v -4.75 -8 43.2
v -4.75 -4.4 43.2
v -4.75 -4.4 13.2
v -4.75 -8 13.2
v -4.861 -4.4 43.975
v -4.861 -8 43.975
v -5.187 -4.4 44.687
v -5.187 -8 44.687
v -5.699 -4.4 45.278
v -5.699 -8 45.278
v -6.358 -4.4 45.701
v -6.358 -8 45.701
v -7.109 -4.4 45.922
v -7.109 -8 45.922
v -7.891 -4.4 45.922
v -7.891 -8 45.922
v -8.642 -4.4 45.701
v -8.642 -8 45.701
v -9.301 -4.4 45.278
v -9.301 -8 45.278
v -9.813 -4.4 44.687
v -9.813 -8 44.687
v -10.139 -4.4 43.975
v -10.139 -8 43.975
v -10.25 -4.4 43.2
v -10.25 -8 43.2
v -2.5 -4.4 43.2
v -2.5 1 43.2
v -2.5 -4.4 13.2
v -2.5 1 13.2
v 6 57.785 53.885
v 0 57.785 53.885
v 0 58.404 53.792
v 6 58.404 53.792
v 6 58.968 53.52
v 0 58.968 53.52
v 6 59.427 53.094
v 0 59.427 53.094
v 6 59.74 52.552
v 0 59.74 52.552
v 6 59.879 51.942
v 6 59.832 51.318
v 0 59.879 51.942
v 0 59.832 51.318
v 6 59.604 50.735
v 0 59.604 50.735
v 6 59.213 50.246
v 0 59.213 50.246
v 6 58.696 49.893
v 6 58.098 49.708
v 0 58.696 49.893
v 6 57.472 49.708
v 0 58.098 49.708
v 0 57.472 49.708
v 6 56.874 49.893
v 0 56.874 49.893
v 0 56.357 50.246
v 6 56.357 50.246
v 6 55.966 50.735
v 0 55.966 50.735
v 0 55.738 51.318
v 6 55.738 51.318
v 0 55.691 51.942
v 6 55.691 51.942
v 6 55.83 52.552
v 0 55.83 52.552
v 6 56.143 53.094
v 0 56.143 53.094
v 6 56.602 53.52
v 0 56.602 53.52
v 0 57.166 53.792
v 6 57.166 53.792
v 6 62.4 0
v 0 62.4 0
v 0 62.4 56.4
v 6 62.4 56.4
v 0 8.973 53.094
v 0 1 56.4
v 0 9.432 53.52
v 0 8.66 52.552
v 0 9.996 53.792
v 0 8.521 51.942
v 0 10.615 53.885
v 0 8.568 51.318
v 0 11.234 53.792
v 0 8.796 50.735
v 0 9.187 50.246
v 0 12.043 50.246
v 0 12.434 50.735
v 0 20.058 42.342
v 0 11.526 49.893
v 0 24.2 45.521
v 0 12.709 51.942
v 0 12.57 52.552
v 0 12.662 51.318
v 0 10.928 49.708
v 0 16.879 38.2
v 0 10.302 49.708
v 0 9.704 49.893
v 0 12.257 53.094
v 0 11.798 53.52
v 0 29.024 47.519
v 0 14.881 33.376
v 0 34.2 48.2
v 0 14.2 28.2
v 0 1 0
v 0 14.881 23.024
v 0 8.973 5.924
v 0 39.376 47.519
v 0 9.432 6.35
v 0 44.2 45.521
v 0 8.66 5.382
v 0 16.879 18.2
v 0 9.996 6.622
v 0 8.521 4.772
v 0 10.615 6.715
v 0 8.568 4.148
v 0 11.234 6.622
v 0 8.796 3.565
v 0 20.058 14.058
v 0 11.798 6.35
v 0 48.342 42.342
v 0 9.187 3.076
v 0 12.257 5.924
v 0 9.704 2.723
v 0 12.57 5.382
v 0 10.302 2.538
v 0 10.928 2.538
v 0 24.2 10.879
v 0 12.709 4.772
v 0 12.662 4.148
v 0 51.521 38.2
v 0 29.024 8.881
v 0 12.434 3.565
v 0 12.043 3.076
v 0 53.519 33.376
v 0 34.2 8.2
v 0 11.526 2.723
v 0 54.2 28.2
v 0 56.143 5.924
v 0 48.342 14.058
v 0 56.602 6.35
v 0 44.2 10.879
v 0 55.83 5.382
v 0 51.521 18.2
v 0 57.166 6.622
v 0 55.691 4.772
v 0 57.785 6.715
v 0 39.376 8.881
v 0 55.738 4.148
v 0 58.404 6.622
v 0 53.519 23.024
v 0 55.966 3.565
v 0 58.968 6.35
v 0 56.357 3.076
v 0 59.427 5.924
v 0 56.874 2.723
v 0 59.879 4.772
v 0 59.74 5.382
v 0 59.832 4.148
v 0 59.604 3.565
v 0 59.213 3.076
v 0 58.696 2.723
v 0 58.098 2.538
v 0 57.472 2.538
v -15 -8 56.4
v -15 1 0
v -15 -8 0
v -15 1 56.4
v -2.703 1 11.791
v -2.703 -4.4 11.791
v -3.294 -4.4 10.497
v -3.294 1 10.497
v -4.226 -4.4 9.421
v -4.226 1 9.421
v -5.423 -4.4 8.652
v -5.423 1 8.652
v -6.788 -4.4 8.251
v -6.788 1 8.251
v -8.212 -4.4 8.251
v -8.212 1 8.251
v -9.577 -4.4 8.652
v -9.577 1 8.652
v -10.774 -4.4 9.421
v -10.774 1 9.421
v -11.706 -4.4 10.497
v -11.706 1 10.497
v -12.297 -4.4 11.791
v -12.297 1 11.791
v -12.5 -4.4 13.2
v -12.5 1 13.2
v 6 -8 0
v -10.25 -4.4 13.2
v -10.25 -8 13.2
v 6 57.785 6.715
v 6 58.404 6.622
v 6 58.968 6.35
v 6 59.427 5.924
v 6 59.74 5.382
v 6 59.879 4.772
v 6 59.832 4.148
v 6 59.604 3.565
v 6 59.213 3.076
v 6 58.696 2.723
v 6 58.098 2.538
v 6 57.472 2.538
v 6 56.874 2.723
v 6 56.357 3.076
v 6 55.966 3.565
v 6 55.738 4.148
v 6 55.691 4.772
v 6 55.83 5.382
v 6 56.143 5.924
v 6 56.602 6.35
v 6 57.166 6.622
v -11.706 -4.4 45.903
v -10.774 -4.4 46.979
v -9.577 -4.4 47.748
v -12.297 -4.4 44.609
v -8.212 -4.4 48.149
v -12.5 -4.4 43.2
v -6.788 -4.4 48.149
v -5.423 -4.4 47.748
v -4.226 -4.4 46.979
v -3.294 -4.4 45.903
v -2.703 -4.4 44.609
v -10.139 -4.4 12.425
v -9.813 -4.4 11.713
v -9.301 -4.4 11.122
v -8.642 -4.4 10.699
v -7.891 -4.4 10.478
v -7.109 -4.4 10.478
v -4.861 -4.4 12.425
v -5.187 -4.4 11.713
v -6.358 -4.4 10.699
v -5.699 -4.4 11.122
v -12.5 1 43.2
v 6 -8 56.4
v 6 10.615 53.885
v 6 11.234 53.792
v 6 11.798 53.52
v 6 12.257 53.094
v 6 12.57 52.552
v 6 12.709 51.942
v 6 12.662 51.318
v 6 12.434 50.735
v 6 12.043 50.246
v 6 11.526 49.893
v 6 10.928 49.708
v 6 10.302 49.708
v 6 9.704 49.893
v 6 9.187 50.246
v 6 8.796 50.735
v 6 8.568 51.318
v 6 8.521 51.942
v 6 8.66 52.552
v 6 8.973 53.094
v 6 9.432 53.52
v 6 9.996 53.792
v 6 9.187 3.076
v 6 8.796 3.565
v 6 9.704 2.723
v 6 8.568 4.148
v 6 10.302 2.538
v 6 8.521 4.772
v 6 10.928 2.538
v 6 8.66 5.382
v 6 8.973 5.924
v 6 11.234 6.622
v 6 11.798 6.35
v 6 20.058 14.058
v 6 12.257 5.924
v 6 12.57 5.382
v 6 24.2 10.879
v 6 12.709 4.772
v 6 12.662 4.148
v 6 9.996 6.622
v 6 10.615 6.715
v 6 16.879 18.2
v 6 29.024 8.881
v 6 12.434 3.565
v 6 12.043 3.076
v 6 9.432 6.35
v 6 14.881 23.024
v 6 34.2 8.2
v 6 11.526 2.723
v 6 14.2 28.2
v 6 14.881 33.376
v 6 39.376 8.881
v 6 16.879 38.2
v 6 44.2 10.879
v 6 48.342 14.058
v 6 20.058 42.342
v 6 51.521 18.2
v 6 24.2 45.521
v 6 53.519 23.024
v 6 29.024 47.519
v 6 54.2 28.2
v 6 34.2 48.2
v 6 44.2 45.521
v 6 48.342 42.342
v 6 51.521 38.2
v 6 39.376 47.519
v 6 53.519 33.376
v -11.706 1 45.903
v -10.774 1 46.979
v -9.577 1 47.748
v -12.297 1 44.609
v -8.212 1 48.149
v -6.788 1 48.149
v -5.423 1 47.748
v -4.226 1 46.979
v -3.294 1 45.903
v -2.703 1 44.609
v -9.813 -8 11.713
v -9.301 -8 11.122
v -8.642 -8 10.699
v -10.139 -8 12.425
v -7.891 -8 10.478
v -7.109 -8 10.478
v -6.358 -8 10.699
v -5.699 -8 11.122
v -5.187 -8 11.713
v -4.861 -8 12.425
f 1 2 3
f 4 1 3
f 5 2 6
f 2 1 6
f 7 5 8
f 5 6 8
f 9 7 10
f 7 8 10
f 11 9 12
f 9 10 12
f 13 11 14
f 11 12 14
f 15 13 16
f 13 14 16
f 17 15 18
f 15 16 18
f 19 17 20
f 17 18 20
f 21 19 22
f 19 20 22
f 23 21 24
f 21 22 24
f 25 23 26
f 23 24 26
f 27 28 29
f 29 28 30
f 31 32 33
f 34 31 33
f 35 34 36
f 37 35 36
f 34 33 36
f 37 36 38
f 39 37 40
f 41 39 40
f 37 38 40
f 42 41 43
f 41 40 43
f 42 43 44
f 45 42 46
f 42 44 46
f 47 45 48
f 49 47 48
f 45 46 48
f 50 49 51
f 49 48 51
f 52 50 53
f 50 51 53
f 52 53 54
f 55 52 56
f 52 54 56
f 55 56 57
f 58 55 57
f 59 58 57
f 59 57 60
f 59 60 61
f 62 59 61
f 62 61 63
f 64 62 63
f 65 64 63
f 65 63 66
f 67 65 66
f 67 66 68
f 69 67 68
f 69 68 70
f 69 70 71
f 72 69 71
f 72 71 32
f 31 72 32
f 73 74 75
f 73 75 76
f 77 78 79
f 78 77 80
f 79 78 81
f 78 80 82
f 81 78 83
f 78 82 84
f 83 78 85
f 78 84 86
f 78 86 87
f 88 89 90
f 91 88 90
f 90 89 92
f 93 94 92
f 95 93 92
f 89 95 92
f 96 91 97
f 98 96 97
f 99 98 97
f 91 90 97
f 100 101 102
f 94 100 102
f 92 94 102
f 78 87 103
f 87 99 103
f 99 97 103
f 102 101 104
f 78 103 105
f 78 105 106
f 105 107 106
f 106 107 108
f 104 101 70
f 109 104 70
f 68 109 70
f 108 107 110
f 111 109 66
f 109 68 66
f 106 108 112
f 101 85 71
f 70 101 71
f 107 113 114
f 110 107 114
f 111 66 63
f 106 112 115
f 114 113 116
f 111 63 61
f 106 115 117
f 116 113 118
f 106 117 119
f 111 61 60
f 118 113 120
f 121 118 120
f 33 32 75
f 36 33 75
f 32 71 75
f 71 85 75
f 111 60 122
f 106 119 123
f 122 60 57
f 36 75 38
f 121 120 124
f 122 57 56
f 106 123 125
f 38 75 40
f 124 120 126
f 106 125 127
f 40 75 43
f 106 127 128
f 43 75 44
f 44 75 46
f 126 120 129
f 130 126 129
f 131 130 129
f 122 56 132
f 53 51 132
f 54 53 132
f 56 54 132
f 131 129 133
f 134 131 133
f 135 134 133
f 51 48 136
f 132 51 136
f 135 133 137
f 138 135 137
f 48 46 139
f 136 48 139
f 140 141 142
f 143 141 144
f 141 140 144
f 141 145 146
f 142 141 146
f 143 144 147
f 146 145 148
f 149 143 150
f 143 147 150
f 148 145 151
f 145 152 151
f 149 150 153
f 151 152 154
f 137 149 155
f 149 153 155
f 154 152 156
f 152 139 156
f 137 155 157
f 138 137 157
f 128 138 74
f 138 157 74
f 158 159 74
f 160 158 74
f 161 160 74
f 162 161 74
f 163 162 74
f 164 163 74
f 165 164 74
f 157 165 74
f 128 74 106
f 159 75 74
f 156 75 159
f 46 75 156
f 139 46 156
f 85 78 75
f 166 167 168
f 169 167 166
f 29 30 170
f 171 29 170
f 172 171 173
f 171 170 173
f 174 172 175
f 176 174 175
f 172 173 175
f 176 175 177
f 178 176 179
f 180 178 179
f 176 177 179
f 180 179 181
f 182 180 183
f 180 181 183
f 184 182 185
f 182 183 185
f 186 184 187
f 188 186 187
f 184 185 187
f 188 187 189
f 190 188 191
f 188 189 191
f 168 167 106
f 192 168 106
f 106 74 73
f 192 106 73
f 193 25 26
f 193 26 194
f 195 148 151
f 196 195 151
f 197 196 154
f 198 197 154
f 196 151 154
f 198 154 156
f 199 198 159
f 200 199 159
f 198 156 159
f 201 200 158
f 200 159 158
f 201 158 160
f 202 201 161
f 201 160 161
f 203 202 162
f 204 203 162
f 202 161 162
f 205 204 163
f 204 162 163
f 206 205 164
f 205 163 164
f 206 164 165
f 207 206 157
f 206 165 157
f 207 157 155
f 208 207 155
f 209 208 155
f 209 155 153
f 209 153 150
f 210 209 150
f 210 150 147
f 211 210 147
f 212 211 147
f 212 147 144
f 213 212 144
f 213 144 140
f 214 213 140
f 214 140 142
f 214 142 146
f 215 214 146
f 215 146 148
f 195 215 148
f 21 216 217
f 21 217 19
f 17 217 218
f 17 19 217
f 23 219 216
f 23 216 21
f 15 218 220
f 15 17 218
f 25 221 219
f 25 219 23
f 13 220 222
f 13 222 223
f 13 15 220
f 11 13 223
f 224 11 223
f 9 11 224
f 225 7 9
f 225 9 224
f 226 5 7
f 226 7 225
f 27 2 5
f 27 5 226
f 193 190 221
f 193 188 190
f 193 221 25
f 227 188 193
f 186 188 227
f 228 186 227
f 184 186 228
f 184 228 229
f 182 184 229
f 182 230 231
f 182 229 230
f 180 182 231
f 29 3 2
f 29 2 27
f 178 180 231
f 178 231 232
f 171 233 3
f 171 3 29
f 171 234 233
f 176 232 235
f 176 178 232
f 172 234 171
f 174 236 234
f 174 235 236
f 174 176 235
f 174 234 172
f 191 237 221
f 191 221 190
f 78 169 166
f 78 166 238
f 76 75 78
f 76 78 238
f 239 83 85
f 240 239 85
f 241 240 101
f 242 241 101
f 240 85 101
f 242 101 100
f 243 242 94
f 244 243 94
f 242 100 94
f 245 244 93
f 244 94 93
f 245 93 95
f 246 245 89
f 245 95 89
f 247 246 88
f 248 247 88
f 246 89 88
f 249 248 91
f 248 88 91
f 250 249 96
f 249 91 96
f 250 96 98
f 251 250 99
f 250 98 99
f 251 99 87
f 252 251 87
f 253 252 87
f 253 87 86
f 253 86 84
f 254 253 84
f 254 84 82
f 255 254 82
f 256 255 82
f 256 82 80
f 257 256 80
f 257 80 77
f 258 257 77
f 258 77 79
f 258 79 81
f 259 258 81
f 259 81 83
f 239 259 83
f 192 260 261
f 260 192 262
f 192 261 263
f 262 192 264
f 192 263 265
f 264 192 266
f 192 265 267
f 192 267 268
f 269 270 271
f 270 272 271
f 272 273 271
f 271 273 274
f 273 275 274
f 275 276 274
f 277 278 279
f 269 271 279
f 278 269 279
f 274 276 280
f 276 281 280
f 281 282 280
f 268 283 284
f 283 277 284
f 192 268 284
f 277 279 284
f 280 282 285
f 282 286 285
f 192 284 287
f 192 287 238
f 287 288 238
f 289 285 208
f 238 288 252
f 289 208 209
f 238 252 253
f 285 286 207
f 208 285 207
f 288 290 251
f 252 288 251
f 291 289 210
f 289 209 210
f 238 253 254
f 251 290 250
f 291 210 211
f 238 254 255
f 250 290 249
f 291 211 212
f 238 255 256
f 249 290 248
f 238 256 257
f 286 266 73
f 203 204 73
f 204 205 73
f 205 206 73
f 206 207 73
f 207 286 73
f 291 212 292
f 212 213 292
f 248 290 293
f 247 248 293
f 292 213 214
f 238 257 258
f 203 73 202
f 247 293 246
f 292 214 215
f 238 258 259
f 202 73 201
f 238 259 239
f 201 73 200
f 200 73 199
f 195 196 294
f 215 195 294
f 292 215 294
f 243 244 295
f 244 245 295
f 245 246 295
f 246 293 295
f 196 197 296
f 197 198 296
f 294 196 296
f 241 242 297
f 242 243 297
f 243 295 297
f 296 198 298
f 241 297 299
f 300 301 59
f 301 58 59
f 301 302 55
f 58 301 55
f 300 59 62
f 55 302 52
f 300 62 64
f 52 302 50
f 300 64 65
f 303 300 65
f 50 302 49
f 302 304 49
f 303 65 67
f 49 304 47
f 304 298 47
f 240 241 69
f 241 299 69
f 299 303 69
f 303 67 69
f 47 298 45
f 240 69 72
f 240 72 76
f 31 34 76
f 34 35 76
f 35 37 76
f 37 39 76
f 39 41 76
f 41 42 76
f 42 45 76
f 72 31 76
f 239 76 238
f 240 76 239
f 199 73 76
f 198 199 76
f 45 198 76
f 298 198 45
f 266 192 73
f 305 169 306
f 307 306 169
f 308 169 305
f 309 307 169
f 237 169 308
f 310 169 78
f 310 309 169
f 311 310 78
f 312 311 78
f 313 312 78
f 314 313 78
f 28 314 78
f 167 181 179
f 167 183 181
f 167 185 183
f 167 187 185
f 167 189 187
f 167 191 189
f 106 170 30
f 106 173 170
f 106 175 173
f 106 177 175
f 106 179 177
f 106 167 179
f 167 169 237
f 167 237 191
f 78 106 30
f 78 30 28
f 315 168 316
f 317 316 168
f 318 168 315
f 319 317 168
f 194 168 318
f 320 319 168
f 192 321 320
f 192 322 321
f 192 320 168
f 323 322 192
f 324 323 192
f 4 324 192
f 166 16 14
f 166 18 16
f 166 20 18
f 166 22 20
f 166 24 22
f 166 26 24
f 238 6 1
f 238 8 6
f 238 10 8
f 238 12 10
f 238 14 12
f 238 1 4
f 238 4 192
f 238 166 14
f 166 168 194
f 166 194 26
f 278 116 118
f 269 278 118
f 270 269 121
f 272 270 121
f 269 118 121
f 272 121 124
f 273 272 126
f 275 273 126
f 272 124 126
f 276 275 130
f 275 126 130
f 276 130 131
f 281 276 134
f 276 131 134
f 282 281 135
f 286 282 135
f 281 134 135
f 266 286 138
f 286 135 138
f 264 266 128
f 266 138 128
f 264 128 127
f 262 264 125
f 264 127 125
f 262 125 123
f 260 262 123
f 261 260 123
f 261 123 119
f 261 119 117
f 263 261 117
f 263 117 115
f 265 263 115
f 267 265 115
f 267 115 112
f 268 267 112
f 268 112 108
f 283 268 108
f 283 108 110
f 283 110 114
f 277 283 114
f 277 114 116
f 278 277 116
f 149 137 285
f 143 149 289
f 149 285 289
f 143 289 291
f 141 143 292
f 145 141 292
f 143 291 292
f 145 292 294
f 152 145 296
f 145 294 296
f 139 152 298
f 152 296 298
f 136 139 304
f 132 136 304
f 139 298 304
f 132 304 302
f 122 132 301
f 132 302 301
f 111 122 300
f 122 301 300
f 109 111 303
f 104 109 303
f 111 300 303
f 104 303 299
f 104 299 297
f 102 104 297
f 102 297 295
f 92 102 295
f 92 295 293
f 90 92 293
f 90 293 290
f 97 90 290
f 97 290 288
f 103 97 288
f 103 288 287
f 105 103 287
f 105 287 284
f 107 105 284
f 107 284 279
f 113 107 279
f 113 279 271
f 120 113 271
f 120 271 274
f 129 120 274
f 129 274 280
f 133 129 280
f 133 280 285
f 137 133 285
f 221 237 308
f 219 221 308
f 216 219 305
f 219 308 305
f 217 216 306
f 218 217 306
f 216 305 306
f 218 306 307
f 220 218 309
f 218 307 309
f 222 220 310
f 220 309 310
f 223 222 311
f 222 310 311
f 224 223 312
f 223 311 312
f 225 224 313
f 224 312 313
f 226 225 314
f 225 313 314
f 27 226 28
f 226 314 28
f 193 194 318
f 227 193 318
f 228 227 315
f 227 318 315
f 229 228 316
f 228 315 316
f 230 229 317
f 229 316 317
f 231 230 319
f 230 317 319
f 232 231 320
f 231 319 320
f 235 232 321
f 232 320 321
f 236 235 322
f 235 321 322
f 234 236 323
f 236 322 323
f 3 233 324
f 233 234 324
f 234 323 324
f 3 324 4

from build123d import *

# Parameters (mm, degrees)
SKETCH_1_W                     = 6
SKETCH_1_H                     = 62.4
EXTRUDE_1_DEPTH                = 56.4
SKETCH_3_W                     = 56.4
SKETCH_3_H                     = 6
EXTRUDE_3_DEPTH                = 15
HOLE_WIZARD_M5_1_D             = 4.2
HOLE_WIZARD_M5_1_DEPTH         = 12.4
HOLE_WIZARD_M5_1_TIP           = 1.2618073
SKETCH_6_R                     = 20
CUT_EXTRUDE_1_DEPTH            = 15
SKETCH_7_W                     = 21
SKETCH_7_H                     = 56.4
EXTRUDE_4_DEPTH                = 8
SKETCH_8_W                     = 15
SKETCH_8_H                     = 56.4
CUT_EXTRUDE_2_DEPTH            = 5
HOLE_WIZARD_M5_1_2_D           = 5.5
HOLE_WIZARD_M5_1_2_DEPTH       = 12.4
HOLE_WIZARD_M5_1_2_CBORE_D     = 10
HOLE_WIZARD_M5_1_2_CBORE_DEPTH = 5.4
HOLE_WIZARD_M5_1_2_TIP         = 1.652366702
SKETCH_11_W                    = 10
SKETCH_11_H                    = 30
CUT_EXTRUDE_3_DEPTH            = 5.4
SKETCH_12_W                    = 5.5
SKETCH_12_H                    = 30
CUT_EXTRUDE_4_DEPTH            = 10


with BuildPart() as part:
    # 草图1 → 凸台-拉伸1 (new body)
    with BuildSketch(Plane.XY):
        with Locations((3, 31.2)):
            Rectangle(SKETCH_1_W, SKETCH_1_H)
    extrude(amount=EXTRUDE_1_DEPTH)

    # 草图3 → 凸台-拉伸3 (add)
    with BuildSketch(Plane.ZY):
        with Locations((28.2, 3)):
            Rectangle(SKETCH_3_W, SKETCH_3_H)
    extrude(amount=EXTRUDE_3_DEPTH)

    # Hole Wizard M5 _1
    with Locations(Plane(origin=(6, 0, 0), x_dir=(0, 0, -1), z_dir=(1, 0, 0))):
        with Locations((-51.785, 57.785), (-4.615, 57.785), (-4.615, 10.615), (-51.785, 10.615)):
            Hole(HOLE_WIZARD_M5_1_D / 2, depth=HOLE_WIZARD_M5_1_DEPTH)
            with Locations((0, 0, -(HOLE_WIZARD_M5_1_DEPTH + HOLE_WIZARD_M5_1_TIP / 2))):  # 118° drill point
                Cone(0, HOLE_WIZARD_M5_1_D / 2, HOLE_WIZARD_M5_1_TIP, mode=Mode.SUBTRACT)

    # 草图6 → 切除-拉伸1 (cut)
    with BuildSketch(Plane(origin=(6, 0, 0), x_dir=(0, 0, -1), z_dir=(1, 0, 0))):
        with Locations((-28.2, 34.2)):
            Circle(SKETCH_6_R)
    extrude(amount=-CUT_EXTRUDE_1_DEPTH, mode=Mode.SUBTRACT)

    # 草图7 → 凸台-拉伸4 (add)
    with BuildSketch(Plane.XZ):
        with Locations((-4.5, 28.2)):
            Rectangle(SKETCH_7_W, SKETCH_7_H)
    extrude(amount=EXTRUDE_4_DEPTH)

    # 草图8 → 切除-拉伸2 (cut)
    with BuildSketch(Plane(origin=(0, 6, 0), x_dir=(1, 0, 0), z_dir=(0, 1, 0))):
        with Locations((-7.5, -28.2)):
            Rectangle(SKETCH_8_W, SKETCH_8_H)
    extrude(amount=-CUT_EXTRUDE_2_DEPTH, mode=Mode.SUBTRACT)

    # Hole Wizard M5 _1 2
    with Locations(Plane(origin=(0, 1, 0), x_dir=(1, 0, 0), z_dir=(0, 1, 0))):
        with Locations((-7.5, -13.2), (-7.5, -43.2)):
            CounterBoreHole(HOLE_WIZARD_M5_1_2_D / 2, HOLE_WIZARD_M5_1_2_CBORE_D / 2, HOLE_WIZARD_M5_1_2_CBORE_DEPTH, depth=HOLE_WIZARD_M5_1_2_DEPTH)
            with Locations((0, 0, -(HOLE_WIZARD_M5_1_2_DEPTH + HOLE_WIZARD_M5_1_2_TIP / 2))):  # 118° drill point
                Cone(0, HOLE_WIZARD_M5_1_2_D / 2, HOLE_WIZARD_M5_1_2_TIP, mode=Mode.SUBTRACT)

    # 草图11 → 切除-拉伸3 (cut)
    with BuildSketch(Plane(origin=(0, 1, 0), x_dir=(1, 0, 0), z_dir=(0, 1, 0))):
        with Locations((-7.5, -28.2)):
            Rectangle(SKETCH_11_W, SKETCH_11_H)
    extrude(amount=-CUT_EXTRUDE_3_DEPTH, mode=Mode.SUBTRACT)

    # 草图12 → 切除-拉伸4 (cut)
    with BuildSketch(Plane(origin=(0, -4.4, 0), x_dir=(1, 0, 0), z_dir=(0, 1, 0))):
        with Locations((-7.5, -28.2)):
            Rectangle(SKETCH_12_W, SKETCH_12_H)
    extrude(amount=-CUT_EXTRUDE_4_DEPTH, mode=Mode.SUBTRACT)


solid = part.part
